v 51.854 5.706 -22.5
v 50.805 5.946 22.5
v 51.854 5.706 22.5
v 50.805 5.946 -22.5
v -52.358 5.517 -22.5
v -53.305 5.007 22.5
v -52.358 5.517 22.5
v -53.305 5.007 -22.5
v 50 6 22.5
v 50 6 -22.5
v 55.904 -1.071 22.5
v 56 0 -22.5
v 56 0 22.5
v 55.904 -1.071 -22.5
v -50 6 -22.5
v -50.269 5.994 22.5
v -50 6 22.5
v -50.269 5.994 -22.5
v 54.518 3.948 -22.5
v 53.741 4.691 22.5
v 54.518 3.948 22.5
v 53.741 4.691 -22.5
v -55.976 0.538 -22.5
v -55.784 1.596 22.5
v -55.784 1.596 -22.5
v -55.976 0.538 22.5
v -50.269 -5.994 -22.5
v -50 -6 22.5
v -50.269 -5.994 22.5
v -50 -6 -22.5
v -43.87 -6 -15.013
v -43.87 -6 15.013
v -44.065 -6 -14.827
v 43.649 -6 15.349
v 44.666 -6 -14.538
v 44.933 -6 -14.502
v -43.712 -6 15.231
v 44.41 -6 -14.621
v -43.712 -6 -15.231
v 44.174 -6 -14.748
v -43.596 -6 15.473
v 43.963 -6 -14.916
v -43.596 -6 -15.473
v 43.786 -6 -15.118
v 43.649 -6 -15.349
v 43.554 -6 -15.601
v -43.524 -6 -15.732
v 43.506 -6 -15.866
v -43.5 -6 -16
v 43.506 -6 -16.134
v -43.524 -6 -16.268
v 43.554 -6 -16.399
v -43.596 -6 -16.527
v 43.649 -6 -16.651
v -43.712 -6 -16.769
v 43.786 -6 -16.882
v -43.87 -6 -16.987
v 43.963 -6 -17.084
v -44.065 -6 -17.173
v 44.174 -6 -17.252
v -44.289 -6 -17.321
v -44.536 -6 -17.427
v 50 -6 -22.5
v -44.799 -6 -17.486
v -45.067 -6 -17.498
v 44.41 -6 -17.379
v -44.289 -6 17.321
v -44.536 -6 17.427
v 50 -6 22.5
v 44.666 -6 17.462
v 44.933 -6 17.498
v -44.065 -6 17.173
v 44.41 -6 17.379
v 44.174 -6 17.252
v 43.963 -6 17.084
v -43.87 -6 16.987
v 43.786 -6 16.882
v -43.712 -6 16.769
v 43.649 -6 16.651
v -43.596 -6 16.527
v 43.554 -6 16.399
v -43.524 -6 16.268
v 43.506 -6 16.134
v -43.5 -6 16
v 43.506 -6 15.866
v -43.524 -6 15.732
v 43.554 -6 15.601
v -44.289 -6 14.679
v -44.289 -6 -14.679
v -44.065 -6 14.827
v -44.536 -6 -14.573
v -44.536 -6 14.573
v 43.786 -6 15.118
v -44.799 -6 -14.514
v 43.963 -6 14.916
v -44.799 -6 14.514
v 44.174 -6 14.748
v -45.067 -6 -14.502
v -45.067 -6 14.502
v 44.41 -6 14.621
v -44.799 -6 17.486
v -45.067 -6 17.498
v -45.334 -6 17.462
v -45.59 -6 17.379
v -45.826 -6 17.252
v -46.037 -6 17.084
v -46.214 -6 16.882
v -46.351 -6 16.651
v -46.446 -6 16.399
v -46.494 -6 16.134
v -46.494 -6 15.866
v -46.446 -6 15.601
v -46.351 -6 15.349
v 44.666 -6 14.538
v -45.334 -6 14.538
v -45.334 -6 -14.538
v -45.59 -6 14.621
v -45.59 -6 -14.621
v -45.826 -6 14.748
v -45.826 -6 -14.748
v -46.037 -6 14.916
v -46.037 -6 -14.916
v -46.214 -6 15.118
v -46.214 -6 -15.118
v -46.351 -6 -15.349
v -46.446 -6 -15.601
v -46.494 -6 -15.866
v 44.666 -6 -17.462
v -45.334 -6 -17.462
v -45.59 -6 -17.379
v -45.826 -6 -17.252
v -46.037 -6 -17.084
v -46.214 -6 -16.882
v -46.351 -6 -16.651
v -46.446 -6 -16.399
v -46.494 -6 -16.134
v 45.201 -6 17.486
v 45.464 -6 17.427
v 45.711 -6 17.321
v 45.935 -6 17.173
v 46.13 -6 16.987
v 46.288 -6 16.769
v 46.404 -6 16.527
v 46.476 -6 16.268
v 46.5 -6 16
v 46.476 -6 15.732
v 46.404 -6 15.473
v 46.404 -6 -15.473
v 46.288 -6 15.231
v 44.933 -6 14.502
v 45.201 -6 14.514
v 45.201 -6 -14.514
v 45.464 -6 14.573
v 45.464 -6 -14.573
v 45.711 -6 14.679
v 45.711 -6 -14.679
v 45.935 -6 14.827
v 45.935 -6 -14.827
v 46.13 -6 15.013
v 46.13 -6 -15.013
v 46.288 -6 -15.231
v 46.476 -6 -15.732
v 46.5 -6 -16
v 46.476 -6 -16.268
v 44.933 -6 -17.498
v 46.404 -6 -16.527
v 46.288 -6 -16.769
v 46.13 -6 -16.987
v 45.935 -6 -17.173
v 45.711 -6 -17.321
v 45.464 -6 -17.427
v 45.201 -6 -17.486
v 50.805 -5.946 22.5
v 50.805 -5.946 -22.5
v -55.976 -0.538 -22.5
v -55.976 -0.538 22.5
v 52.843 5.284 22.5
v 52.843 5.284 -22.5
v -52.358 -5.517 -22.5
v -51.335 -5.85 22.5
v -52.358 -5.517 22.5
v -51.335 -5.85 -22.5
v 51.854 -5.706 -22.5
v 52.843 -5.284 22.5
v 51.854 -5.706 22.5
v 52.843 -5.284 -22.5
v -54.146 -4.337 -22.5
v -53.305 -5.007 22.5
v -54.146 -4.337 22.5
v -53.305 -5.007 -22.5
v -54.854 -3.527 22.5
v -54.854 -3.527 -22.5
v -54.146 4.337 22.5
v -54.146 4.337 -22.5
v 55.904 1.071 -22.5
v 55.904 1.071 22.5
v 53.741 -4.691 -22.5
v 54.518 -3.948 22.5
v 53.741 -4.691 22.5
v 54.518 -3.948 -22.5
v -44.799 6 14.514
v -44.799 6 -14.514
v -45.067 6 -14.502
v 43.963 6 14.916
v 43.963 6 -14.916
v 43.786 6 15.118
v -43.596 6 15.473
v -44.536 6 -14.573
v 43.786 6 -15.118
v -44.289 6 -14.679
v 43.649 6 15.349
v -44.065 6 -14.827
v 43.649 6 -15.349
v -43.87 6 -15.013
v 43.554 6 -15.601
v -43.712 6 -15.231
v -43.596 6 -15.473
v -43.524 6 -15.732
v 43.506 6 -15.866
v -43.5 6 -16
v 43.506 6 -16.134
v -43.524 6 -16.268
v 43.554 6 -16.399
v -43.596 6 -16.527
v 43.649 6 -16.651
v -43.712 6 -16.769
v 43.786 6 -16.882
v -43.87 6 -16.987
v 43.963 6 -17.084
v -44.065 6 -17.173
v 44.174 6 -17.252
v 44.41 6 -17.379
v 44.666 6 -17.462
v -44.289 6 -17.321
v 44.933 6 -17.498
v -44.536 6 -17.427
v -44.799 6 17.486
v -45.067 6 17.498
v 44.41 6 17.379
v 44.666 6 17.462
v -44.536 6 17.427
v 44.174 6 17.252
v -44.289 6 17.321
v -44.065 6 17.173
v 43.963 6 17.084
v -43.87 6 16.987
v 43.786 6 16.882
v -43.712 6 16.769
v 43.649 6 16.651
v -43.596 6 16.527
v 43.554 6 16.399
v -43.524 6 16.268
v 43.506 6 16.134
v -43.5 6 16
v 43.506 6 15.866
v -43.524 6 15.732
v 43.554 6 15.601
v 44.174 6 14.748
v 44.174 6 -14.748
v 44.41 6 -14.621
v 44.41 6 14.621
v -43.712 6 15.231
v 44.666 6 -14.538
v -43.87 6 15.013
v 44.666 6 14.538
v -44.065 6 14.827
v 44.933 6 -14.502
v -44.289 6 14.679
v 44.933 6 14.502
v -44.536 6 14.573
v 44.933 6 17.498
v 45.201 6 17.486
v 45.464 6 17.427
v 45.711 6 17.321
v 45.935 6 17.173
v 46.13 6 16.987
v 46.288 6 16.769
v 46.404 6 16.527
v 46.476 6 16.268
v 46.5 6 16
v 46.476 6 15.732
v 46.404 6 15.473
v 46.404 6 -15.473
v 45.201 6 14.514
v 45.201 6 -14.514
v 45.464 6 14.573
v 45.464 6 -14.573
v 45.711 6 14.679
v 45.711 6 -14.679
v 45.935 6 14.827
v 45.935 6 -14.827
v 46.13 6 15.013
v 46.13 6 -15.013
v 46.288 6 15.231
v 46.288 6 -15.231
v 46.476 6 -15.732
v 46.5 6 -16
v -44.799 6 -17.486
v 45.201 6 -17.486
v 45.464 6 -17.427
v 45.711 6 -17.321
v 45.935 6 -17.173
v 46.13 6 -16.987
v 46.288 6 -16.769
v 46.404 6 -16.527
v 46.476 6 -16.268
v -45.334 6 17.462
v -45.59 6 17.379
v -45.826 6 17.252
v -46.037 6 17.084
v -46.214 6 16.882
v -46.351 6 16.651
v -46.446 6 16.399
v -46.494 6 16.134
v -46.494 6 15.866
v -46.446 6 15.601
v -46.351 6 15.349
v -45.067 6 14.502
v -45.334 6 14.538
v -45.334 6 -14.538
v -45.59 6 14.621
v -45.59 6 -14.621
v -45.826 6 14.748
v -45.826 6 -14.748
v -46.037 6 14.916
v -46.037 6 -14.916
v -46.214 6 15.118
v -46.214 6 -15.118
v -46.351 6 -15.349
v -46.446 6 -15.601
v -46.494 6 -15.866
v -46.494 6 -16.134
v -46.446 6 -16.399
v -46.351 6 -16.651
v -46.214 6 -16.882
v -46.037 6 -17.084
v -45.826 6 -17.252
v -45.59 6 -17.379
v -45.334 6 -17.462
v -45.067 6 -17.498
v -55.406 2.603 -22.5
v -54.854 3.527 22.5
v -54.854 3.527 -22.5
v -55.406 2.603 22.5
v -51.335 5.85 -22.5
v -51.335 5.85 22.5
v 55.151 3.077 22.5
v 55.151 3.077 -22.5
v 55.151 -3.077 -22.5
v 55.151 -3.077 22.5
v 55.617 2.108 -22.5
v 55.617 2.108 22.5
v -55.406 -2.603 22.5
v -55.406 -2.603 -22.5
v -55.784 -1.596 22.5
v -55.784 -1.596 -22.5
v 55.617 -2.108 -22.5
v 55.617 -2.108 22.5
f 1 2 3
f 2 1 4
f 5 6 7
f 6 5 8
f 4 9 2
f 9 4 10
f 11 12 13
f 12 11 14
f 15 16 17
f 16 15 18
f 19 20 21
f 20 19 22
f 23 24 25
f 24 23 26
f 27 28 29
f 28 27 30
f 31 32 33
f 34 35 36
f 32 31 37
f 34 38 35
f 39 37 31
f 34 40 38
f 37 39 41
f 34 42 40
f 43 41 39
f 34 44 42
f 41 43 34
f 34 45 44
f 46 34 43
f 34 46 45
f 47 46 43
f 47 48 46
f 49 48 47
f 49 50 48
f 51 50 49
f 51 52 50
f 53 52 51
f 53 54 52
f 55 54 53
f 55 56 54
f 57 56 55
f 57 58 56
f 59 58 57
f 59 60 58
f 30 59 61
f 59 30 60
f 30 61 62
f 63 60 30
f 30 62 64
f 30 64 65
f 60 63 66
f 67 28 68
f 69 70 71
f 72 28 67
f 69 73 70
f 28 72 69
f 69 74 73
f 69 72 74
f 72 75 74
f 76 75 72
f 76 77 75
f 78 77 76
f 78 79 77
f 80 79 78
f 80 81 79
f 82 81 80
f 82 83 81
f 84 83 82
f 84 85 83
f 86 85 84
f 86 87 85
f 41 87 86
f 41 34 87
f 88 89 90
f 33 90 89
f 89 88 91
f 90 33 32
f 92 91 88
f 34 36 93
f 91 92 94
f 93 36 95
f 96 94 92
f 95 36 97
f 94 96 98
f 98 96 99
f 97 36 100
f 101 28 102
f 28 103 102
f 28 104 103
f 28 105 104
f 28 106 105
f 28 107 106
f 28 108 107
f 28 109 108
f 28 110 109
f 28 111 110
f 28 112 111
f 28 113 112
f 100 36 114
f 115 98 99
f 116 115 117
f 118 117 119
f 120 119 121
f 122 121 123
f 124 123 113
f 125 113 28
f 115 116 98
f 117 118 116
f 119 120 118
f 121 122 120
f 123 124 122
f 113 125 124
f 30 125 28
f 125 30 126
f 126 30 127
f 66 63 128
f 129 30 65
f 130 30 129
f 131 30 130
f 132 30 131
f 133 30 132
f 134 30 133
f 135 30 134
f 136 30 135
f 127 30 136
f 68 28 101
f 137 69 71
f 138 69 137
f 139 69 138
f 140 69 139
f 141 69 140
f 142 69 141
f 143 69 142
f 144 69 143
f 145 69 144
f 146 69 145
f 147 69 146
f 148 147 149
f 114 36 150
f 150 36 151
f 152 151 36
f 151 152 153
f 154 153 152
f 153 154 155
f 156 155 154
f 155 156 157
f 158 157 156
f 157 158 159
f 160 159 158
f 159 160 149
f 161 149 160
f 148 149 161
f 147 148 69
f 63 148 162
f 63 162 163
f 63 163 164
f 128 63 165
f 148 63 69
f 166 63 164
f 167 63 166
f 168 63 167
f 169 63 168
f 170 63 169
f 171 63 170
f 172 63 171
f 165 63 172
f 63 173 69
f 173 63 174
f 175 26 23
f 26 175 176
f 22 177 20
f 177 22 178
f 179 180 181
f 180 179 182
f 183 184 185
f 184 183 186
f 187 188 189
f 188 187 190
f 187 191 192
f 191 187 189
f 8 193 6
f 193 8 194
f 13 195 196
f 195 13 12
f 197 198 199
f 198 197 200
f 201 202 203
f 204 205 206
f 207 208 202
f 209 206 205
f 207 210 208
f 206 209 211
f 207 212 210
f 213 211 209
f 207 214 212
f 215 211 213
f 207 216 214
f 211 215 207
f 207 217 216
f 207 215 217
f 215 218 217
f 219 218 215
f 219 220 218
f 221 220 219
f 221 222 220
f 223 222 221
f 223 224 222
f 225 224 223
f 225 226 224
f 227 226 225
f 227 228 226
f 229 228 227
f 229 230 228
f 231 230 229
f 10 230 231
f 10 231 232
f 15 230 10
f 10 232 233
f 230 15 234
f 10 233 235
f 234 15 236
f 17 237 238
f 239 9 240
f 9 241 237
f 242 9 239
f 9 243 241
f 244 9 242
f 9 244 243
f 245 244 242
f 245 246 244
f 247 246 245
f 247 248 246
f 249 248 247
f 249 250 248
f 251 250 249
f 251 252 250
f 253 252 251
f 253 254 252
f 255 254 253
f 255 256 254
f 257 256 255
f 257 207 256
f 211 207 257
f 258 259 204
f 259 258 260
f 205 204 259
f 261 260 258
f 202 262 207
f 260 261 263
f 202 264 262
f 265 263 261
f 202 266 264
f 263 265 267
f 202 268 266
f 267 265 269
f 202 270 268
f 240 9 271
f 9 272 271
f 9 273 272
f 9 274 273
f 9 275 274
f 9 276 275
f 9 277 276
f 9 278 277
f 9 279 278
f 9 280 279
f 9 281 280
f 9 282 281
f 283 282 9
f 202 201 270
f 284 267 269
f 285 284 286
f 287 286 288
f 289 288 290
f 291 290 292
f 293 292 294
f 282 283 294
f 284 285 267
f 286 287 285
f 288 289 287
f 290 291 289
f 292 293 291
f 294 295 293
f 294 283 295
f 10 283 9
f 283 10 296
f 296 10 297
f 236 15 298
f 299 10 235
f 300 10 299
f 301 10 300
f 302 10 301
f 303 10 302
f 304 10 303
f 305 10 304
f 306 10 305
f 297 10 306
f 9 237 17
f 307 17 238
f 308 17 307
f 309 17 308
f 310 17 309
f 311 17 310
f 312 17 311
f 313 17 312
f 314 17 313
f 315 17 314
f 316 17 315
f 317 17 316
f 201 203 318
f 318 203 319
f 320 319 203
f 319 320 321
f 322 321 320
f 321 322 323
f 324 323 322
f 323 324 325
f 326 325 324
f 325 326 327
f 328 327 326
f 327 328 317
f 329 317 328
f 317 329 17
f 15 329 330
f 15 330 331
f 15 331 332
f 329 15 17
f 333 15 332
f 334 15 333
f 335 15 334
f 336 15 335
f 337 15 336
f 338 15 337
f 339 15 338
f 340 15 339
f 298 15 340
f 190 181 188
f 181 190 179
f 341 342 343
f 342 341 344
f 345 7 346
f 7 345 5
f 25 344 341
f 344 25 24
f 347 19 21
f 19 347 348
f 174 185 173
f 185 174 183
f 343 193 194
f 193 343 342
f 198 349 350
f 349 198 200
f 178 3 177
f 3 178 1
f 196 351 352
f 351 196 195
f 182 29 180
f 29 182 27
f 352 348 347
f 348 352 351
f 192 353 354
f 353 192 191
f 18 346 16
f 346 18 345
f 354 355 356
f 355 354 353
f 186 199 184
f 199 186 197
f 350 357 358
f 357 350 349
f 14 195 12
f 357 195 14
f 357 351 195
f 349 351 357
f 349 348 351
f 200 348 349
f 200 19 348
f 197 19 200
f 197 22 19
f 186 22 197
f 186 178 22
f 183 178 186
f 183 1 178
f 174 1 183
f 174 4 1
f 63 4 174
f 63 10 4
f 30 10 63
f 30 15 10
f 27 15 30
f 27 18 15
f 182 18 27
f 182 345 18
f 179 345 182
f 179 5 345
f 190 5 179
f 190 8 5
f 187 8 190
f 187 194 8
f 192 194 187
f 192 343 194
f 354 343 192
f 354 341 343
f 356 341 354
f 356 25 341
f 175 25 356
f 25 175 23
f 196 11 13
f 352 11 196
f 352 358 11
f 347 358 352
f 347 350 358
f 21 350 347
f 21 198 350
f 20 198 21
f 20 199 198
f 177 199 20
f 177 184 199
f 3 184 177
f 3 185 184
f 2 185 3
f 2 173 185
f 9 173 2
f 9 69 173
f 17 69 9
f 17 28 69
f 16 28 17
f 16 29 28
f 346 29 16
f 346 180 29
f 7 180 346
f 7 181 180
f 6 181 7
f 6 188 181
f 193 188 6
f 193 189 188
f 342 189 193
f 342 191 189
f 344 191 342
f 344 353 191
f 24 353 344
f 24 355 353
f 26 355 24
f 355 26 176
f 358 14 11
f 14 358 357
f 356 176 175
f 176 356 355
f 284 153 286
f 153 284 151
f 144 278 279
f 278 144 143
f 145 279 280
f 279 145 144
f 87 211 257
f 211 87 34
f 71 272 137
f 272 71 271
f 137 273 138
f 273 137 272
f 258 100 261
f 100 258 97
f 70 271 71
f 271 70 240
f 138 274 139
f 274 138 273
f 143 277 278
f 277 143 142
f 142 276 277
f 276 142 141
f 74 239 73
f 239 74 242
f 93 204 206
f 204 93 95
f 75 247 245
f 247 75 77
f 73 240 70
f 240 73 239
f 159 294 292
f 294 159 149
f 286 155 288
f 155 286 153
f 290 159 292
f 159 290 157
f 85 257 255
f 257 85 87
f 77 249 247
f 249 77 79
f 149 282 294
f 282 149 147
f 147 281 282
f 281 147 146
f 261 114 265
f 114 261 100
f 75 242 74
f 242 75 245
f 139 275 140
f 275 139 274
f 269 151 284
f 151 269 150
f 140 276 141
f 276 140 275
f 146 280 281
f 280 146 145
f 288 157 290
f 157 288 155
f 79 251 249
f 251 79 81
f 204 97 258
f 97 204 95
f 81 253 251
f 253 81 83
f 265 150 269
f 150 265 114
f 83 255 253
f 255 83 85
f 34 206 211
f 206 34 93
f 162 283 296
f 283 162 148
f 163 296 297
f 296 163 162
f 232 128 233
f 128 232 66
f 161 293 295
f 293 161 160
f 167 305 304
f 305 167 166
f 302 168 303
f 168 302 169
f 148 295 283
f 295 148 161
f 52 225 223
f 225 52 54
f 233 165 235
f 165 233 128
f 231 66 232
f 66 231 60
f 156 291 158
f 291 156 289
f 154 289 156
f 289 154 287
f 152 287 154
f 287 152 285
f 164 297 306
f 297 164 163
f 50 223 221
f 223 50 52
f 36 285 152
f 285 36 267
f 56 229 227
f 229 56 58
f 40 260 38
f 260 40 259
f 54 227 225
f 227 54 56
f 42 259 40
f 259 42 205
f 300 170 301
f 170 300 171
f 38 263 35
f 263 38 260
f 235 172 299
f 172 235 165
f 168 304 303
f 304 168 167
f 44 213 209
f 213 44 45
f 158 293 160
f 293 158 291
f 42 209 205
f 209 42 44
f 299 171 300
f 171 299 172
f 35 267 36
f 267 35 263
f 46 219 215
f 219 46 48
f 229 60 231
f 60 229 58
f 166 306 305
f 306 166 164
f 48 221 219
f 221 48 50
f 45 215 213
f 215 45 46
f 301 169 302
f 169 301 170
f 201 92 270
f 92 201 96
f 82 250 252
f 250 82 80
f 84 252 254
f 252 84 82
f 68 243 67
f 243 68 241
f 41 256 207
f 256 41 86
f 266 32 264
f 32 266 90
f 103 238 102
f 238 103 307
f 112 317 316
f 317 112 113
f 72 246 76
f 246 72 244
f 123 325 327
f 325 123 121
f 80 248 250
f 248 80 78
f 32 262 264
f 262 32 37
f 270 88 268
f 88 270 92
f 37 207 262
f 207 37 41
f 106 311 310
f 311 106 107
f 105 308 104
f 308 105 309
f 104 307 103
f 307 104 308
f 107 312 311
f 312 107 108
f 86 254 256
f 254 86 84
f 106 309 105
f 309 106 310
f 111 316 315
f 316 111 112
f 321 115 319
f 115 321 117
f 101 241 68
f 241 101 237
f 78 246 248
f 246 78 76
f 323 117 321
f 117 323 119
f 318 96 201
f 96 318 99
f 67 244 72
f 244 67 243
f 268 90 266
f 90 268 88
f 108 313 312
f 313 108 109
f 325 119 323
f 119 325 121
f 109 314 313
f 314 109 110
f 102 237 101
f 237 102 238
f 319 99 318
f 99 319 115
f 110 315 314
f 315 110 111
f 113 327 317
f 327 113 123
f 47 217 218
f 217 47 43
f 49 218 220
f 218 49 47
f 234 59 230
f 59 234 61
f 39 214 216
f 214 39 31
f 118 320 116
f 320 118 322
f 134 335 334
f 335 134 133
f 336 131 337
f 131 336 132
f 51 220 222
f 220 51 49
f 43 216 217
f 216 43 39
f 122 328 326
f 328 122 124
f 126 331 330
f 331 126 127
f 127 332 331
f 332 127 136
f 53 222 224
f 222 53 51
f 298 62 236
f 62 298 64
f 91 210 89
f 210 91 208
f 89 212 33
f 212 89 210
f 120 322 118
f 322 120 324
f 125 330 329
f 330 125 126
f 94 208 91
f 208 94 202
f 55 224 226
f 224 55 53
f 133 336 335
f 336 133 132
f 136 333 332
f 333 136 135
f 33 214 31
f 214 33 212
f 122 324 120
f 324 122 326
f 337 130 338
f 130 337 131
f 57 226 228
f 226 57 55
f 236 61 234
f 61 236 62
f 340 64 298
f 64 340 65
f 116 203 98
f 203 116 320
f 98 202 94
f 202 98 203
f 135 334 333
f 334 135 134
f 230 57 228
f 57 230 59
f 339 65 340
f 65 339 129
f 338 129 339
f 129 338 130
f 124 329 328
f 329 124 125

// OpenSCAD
 $fn=35;
 legth=100;
 height=45;
 width=12;
difference(){
    hull(){
        cube([legth,width,height], center=true);
        translate([-50,0,0]) cylinder(d=12,h=height, center=true);
        translate([50,0,0]) cylinder(d=12,h=height, center=true);
    }
    rotate([90,0,0])translate([45,16,0])cylinder(h=99,r=1.5,center=true);
    rotate([90,0,0])translate([45,-16,0])cylinder(h=99,r=1.5,center=true);
    rotate([90,0,0])translate([-45,16,0])cylinder(h=99,r=1.5,center=true);
    rotate([90,0,0])translate([-45,-16,0])cylinder(h=99,r=1.5,center=true);
} 
 
